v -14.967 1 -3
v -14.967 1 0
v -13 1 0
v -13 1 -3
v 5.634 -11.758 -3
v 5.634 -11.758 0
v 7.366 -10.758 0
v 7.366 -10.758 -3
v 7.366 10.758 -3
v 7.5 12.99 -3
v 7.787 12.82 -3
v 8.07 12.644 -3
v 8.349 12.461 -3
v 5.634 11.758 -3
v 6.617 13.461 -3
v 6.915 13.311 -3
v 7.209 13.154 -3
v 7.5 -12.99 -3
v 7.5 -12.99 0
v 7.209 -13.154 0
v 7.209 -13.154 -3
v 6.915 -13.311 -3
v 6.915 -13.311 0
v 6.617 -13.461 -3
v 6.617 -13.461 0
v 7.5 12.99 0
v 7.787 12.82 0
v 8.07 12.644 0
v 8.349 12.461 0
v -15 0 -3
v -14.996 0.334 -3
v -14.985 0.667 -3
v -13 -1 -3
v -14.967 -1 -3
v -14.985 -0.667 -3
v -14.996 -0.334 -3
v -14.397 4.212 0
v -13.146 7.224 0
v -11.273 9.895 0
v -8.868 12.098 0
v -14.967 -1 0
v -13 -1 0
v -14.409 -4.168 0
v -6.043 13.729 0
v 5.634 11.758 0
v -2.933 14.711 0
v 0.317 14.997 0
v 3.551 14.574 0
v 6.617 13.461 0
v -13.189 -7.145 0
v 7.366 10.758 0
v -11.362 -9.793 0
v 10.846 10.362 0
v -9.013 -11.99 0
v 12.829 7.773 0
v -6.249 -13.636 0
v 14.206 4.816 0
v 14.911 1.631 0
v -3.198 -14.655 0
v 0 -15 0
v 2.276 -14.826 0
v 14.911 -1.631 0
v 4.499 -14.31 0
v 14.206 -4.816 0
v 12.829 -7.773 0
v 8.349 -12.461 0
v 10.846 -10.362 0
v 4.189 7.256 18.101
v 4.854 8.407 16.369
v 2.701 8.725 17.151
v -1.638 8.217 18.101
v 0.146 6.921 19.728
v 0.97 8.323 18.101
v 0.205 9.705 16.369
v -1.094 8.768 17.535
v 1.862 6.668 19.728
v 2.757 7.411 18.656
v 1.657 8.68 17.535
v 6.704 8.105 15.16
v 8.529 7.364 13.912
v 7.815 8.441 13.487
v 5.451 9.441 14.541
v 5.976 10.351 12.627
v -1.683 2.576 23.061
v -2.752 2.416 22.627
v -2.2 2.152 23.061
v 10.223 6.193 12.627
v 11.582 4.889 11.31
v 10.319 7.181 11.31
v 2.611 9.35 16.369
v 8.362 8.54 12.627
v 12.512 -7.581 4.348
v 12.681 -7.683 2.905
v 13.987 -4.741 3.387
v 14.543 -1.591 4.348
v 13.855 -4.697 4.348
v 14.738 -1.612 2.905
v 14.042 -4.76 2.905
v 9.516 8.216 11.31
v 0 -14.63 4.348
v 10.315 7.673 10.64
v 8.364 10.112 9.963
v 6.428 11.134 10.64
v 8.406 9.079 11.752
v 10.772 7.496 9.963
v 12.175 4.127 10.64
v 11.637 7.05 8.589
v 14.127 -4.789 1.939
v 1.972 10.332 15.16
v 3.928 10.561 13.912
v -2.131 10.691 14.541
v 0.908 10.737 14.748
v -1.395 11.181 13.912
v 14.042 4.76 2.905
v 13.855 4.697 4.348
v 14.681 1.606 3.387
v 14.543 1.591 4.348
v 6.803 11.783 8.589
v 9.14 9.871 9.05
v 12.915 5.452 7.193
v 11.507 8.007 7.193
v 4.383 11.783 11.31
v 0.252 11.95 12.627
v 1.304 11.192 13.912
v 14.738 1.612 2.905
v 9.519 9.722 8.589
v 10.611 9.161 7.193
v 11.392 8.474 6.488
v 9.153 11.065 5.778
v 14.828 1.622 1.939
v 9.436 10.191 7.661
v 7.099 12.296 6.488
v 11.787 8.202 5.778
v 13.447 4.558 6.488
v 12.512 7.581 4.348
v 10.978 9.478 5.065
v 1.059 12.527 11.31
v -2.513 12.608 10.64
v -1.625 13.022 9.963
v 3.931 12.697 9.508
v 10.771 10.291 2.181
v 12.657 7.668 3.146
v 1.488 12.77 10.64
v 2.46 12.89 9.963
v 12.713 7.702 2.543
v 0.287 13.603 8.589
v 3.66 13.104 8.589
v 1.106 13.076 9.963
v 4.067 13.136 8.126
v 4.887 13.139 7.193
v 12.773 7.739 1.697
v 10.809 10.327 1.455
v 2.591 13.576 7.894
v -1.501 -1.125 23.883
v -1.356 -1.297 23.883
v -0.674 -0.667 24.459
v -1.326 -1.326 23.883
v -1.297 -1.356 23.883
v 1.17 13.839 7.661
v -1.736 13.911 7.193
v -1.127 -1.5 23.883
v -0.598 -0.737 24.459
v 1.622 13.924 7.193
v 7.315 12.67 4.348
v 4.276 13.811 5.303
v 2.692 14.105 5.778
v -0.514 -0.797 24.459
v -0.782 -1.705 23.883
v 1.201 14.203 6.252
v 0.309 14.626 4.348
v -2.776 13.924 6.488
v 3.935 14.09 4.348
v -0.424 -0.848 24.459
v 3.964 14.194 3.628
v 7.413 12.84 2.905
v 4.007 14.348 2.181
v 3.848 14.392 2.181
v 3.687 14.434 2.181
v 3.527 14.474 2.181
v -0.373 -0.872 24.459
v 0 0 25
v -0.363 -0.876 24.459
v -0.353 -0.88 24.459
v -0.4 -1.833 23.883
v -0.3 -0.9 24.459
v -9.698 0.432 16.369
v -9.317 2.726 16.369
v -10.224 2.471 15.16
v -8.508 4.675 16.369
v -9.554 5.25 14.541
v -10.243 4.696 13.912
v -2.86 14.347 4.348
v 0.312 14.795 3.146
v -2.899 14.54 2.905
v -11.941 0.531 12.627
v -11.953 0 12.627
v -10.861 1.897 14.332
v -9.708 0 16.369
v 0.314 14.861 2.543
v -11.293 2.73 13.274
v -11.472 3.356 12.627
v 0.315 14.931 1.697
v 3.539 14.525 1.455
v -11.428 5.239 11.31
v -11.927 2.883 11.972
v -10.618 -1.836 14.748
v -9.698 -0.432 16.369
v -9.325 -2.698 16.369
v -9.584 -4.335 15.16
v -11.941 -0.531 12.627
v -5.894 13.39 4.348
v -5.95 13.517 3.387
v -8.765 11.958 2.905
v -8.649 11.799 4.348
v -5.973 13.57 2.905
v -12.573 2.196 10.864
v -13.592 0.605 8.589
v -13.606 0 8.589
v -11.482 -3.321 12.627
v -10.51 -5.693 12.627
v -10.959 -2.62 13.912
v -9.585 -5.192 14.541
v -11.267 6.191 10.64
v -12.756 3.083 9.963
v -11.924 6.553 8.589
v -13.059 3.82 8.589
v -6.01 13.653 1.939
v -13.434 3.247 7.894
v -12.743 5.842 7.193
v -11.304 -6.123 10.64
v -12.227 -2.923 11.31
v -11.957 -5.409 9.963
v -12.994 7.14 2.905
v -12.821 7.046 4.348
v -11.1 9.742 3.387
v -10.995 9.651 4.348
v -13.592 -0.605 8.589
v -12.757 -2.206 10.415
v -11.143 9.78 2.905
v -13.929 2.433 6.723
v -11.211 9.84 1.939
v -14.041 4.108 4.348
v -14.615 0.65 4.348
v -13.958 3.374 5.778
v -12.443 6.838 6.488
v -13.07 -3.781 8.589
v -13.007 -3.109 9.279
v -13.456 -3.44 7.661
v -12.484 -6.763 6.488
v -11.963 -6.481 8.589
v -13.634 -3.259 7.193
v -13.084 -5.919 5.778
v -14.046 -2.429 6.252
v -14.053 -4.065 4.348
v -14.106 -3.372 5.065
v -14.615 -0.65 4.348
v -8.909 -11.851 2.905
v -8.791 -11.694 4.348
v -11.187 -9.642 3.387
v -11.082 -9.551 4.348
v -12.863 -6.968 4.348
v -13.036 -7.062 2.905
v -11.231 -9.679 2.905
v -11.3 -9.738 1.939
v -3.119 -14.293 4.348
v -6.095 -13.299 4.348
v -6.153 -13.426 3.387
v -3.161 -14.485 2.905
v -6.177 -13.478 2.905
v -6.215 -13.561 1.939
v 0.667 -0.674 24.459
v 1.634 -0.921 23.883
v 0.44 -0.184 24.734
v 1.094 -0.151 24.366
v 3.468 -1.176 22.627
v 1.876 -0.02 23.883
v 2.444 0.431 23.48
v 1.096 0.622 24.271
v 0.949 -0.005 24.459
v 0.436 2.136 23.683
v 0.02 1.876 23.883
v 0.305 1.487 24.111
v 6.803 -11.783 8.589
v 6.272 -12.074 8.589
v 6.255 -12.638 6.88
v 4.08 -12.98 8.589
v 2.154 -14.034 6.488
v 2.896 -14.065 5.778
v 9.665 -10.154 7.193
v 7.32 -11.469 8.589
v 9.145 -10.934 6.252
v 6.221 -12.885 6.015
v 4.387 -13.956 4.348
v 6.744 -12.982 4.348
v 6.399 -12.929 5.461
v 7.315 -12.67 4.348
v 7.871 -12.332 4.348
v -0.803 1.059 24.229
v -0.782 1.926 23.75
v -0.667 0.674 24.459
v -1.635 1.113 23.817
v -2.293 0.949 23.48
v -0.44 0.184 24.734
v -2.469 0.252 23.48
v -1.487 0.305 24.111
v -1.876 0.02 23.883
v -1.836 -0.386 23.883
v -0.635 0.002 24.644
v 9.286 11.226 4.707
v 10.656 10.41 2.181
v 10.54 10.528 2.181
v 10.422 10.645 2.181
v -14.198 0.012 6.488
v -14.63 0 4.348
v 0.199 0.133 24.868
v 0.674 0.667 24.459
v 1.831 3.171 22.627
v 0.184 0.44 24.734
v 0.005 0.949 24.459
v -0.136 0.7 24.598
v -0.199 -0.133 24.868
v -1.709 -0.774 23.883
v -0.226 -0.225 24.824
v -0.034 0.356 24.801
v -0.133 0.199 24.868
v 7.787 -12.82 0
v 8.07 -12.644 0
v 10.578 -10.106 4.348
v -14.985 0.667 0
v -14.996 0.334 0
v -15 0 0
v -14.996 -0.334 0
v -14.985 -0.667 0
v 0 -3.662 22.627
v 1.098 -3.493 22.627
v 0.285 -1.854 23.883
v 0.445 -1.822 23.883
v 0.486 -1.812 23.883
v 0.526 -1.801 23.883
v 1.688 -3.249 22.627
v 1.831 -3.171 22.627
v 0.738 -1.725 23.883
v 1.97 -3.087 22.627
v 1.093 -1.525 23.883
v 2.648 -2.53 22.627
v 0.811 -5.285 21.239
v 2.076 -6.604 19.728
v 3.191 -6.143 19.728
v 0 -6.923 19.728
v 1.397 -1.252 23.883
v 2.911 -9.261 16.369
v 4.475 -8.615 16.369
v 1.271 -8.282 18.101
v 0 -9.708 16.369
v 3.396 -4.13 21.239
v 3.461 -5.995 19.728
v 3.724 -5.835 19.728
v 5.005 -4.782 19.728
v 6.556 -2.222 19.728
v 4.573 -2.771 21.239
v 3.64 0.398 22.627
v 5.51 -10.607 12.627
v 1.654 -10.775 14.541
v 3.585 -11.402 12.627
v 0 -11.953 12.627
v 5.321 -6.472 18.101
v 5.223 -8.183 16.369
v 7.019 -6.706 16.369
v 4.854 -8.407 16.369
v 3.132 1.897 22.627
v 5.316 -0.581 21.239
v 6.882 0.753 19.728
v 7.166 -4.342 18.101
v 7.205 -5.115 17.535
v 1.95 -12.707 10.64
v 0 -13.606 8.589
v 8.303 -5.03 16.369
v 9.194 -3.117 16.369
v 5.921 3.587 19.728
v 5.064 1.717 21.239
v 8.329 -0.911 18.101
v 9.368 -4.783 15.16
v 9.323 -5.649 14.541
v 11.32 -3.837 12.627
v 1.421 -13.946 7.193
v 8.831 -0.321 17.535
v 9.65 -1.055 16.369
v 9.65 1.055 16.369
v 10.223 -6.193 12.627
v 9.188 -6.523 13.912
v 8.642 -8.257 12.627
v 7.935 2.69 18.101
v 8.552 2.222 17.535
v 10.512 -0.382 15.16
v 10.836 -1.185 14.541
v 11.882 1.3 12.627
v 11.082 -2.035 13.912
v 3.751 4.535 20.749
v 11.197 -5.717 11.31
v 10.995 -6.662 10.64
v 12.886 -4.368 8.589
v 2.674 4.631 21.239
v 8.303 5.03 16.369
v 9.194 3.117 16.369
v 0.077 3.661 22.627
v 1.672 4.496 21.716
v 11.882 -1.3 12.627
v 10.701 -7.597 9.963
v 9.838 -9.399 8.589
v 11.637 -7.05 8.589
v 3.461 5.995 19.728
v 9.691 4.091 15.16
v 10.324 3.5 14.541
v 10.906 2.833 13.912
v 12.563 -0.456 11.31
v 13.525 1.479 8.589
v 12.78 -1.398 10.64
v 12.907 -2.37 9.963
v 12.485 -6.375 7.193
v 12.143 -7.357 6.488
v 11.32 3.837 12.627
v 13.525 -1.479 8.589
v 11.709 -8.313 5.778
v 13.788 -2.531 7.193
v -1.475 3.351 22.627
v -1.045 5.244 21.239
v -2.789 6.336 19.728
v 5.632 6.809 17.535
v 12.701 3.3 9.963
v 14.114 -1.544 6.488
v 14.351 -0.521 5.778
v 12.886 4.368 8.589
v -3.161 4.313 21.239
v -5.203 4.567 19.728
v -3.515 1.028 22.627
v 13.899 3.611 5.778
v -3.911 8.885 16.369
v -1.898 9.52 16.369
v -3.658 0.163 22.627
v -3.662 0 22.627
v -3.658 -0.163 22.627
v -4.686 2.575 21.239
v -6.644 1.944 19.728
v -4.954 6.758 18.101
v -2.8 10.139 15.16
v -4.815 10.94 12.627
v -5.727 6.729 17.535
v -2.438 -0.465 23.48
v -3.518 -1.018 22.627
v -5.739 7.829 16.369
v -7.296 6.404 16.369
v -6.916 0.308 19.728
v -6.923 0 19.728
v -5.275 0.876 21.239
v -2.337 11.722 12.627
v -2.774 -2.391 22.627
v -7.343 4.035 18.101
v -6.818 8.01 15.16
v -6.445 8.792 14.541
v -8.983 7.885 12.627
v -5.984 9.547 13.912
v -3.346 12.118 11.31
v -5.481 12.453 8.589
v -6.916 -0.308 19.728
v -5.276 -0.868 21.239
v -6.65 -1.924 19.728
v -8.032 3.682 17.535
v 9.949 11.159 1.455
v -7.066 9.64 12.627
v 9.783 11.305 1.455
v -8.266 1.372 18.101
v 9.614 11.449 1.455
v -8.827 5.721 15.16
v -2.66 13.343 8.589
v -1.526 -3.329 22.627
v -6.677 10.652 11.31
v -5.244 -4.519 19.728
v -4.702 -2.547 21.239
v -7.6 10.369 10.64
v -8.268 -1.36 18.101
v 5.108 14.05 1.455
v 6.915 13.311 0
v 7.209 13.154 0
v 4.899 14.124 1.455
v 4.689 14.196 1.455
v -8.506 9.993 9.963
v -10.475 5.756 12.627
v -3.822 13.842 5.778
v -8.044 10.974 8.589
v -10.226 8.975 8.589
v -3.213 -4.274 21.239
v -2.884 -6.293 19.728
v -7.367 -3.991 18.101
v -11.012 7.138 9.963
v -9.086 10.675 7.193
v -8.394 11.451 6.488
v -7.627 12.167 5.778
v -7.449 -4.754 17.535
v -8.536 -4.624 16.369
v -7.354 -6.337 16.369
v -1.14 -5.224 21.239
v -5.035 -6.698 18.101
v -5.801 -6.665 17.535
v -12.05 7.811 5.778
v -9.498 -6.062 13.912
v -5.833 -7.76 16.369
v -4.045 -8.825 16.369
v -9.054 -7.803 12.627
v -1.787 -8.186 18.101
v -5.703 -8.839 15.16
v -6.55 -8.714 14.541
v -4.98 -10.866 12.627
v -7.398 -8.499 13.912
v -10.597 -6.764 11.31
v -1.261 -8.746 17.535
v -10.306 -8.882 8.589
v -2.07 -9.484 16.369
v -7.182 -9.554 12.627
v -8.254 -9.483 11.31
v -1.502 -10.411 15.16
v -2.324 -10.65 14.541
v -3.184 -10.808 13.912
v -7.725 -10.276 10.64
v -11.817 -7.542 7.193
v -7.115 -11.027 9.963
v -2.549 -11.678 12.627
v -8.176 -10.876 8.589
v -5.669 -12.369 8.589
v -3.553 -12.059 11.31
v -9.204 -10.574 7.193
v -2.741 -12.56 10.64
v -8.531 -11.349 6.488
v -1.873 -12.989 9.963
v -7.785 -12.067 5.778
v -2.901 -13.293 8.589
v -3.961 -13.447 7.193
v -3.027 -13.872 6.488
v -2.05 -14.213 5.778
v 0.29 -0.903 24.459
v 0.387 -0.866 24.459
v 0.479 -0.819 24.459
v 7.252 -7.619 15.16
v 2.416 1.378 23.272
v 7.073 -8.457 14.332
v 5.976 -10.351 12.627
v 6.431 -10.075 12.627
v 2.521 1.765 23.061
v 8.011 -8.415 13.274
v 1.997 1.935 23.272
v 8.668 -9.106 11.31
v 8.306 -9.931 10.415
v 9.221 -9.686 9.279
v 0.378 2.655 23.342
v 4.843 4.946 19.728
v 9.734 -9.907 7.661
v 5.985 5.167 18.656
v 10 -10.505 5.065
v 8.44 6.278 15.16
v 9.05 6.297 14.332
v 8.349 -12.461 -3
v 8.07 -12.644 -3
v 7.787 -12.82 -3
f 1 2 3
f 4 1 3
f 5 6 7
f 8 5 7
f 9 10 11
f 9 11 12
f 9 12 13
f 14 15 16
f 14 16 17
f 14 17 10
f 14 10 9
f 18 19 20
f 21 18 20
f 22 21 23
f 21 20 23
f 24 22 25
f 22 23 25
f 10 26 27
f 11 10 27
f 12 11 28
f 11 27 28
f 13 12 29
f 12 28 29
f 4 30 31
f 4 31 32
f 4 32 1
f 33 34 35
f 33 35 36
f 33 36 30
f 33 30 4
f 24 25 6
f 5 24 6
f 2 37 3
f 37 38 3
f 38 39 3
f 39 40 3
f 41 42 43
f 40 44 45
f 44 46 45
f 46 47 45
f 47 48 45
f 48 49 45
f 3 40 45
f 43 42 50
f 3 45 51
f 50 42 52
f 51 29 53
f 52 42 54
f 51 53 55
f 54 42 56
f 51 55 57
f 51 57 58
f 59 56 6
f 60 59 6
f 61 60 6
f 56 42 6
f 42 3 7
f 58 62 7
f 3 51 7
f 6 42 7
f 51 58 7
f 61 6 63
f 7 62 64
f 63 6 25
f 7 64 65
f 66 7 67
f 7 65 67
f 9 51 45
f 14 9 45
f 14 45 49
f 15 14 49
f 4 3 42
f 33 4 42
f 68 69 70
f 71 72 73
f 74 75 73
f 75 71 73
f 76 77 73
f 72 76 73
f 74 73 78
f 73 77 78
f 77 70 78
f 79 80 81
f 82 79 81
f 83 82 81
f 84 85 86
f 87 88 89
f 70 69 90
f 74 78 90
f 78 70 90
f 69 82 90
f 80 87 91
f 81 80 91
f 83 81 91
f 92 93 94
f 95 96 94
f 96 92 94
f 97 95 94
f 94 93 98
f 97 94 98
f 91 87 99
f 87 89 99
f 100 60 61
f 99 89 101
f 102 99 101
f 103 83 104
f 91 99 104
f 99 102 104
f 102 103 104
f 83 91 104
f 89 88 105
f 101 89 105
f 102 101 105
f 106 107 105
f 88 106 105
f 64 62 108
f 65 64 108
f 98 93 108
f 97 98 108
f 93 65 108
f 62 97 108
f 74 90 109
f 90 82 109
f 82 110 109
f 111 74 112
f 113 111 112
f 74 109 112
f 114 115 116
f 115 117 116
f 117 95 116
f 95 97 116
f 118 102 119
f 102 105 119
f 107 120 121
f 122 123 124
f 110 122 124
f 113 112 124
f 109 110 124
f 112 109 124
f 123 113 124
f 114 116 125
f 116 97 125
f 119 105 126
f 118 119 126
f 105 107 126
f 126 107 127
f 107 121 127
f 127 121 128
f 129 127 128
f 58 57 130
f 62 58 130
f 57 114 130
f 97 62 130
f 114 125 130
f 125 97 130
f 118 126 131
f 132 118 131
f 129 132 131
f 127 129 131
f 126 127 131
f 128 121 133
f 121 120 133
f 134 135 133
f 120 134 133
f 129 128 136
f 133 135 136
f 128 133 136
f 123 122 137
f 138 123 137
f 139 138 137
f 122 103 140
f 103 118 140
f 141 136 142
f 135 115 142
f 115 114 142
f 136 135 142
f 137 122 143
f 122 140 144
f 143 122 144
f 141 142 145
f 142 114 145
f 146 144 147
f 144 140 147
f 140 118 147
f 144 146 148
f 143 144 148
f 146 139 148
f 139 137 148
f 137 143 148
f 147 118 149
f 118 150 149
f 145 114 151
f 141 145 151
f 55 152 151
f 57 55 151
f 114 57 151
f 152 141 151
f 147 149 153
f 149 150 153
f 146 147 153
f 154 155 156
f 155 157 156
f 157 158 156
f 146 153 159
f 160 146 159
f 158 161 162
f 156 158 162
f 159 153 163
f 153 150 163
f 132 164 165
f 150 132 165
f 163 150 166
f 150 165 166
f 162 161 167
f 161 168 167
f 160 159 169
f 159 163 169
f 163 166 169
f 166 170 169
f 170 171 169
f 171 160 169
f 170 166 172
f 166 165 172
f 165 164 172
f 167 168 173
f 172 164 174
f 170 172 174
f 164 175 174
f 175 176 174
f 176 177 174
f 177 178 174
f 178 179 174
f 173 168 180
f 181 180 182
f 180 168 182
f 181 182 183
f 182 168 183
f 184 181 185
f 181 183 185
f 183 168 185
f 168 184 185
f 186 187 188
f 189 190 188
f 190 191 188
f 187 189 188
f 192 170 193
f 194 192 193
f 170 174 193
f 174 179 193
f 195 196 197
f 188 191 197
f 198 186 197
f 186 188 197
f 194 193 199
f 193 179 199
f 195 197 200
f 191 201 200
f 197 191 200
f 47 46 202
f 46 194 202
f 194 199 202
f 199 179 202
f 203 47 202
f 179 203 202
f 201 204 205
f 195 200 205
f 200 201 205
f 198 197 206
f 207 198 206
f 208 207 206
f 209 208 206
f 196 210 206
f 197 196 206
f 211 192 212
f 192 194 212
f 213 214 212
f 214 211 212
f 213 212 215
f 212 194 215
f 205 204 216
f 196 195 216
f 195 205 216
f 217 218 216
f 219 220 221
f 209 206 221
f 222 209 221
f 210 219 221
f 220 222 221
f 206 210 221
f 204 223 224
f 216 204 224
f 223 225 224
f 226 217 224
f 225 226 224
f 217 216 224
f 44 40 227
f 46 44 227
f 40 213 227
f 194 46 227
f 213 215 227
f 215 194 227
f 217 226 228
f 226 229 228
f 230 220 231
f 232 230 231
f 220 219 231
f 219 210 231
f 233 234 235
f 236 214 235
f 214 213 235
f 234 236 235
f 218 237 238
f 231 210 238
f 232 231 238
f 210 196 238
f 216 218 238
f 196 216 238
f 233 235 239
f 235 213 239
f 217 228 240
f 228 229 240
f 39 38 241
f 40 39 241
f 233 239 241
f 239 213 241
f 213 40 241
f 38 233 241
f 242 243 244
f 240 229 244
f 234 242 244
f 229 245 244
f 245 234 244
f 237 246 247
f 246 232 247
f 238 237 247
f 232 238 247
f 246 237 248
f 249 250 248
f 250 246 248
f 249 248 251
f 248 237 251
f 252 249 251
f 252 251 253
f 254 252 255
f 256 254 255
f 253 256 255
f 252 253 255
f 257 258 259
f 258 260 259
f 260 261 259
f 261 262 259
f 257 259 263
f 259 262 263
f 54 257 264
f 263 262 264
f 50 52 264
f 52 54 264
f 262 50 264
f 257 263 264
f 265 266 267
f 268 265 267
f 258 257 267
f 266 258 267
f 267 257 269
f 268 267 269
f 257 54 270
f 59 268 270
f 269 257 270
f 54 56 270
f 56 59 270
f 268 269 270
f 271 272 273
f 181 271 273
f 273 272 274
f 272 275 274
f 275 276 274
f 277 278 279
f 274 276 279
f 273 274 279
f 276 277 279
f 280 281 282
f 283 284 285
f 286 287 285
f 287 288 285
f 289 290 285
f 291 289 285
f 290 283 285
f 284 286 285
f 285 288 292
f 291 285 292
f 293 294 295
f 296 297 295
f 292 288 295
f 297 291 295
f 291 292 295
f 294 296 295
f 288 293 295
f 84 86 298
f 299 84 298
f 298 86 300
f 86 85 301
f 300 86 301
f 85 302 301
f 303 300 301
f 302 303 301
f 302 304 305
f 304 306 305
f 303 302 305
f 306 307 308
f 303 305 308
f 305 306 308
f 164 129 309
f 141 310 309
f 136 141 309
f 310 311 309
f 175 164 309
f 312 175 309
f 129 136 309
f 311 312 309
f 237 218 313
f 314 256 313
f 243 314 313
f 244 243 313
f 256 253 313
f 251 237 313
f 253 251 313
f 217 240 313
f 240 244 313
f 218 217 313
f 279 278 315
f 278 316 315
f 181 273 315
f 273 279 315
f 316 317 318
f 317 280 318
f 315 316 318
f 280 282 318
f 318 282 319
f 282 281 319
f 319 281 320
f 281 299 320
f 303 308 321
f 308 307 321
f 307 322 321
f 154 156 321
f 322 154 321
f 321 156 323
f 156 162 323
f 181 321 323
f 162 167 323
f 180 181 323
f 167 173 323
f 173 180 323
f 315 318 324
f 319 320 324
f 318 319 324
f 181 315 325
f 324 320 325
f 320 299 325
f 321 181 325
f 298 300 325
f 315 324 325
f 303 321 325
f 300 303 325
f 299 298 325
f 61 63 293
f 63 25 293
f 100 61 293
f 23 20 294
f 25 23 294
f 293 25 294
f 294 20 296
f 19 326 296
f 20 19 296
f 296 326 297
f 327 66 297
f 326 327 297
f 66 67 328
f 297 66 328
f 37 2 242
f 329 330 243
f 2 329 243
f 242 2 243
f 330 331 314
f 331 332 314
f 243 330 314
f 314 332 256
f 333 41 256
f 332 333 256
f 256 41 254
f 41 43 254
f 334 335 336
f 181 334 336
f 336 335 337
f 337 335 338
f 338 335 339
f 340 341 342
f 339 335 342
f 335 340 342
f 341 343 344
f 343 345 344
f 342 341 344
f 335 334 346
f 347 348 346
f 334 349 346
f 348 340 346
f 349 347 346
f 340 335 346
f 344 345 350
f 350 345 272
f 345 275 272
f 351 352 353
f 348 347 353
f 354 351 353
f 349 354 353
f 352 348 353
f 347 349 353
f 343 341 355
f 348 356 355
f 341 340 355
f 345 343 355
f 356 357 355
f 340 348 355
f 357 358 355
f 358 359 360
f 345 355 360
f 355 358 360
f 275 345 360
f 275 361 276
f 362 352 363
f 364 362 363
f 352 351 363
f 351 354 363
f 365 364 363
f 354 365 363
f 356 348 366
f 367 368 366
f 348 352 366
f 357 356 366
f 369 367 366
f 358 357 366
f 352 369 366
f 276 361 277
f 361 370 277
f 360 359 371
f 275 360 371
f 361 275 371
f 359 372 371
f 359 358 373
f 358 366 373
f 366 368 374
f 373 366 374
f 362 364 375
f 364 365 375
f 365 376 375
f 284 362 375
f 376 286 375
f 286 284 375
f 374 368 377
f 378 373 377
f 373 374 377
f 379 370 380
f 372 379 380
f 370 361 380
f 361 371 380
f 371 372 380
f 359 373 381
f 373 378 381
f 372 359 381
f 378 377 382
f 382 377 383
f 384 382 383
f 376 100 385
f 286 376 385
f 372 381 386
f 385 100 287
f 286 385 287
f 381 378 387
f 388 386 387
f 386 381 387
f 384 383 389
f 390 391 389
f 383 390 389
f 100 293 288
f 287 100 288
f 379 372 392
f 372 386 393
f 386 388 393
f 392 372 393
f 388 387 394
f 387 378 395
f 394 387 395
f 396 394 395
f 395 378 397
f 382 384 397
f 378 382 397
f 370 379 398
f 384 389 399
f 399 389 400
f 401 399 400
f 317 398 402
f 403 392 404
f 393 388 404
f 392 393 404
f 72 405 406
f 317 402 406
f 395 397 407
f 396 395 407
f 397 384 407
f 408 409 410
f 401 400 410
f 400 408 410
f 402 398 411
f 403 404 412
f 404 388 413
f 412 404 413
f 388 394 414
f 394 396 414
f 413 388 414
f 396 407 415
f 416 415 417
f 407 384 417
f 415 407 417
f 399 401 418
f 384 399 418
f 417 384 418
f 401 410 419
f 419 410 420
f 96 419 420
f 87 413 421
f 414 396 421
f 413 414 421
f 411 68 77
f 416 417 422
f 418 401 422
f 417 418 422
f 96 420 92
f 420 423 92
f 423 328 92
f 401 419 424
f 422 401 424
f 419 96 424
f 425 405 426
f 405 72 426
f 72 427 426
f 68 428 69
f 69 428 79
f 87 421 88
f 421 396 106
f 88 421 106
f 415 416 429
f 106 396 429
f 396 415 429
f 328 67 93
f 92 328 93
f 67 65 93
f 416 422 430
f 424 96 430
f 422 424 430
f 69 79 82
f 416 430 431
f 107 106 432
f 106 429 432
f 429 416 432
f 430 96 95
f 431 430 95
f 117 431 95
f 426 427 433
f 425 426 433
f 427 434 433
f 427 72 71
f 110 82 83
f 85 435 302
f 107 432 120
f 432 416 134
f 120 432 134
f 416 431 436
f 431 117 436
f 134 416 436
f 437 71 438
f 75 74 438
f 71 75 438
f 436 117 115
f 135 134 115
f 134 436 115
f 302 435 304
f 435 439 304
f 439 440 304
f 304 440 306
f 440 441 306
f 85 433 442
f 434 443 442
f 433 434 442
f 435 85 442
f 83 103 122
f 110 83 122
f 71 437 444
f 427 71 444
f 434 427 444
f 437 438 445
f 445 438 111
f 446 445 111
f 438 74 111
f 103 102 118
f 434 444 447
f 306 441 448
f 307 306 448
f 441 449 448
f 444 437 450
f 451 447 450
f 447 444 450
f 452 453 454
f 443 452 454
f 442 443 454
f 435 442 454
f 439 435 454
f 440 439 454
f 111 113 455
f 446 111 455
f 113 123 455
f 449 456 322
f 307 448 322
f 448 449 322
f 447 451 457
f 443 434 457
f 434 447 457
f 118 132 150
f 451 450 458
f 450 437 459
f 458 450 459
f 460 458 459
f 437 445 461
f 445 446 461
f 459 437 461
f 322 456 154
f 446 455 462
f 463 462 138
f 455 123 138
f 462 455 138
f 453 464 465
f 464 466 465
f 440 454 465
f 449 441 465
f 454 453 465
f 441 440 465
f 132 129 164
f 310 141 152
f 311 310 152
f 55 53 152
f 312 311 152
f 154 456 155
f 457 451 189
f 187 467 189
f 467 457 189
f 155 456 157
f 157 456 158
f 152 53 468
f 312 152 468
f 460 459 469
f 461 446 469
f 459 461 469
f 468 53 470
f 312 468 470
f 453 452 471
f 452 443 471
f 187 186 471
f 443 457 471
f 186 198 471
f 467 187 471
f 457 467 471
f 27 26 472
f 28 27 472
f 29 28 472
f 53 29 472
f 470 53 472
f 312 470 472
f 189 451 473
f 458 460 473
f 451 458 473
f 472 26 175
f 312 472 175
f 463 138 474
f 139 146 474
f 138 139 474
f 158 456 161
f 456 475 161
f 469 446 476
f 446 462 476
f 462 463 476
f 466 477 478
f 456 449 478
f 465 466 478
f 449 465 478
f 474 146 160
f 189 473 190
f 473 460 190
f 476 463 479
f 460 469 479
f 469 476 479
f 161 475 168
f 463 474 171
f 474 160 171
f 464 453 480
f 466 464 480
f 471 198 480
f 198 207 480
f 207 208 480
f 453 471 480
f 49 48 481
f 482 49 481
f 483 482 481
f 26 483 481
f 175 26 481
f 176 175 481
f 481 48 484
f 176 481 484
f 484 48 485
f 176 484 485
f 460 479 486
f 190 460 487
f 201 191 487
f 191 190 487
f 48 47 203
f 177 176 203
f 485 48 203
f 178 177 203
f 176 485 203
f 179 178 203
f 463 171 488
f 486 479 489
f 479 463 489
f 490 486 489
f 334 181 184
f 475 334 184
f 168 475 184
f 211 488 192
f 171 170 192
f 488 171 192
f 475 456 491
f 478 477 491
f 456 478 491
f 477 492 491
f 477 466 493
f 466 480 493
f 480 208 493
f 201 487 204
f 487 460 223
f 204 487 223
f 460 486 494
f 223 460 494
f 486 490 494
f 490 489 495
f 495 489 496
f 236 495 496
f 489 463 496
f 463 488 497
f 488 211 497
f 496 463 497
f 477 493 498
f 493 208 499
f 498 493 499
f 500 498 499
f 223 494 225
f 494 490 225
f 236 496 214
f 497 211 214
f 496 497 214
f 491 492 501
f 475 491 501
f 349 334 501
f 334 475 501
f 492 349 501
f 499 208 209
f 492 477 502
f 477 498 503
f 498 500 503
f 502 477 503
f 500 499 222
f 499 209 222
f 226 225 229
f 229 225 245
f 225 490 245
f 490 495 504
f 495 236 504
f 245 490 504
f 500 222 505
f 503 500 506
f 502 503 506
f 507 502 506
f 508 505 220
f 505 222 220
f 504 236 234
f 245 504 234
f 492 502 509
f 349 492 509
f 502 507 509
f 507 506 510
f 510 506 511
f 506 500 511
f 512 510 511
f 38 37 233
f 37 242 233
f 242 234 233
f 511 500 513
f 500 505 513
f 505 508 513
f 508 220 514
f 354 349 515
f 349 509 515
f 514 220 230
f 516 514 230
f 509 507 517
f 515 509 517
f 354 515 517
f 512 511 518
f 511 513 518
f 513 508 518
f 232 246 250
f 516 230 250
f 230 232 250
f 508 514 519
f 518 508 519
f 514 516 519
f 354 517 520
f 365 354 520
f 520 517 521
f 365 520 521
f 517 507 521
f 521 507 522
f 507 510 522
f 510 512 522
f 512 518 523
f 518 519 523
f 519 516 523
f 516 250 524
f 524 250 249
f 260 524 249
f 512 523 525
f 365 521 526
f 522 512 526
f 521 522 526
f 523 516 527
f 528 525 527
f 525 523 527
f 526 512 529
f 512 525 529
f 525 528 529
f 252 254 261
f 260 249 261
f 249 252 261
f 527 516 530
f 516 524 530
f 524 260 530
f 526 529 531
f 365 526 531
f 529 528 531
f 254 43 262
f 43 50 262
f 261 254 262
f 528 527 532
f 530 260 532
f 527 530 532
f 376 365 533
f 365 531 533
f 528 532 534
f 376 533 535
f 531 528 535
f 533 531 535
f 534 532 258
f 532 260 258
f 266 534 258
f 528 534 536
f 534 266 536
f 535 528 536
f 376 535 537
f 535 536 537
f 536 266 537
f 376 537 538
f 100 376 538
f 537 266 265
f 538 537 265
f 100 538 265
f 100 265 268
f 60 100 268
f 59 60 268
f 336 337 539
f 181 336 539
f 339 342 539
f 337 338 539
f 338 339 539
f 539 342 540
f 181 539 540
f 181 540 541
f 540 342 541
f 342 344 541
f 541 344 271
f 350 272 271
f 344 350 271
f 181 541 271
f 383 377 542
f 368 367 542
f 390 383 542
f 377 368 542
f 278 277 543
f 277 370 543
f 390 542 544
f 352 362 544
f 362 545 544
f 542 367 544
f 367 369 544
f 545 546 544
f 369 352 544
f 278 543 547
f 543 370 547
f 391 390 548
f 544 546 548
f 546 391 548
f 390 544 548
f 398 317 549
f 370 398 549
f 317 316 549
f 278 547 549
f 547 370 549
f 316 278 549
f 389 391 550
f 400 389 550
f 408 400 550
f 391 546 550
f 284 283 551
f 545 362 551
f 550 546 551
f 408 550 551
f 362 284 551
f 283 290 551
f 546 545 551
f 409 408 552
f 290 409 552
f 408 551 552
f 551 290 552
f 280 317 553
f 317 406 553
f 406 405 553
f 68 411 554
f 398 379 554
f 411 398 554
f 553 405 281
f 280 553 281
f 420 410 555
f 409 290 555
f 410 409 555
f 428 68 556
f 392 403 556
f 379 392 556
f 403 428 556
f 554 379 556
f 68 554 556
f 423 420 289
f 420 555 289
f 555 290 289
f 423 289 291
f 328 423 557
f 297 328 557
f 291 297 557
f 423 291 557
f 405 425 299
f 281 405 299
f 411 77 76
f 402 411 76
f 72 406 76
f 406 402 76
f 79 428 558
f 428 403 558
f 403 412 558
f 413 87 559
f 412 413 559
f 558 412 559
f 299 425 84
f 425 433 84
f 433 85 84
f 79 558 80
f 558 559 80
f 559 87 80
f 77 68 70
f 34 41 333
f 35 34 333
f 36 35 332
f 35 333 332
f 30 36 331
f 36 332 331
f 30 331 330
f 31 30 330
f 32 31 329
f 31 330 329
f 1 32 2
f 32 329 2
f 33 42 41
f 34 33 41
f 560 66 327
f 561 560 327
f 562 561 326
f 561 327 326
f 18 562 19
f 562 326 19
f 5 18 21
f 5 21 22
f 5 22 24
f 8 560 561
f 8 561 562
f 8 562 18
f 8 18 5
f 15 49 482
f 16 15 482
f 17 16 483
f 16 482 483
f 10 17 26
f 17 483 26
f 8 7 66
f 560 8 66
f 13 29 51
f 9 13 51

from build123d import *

# Parameters (mm, degrees)
F3_DEPTH = 3
F4_COUNT = 3


with BuildPart() as f1:
    # F0 (on Right) → F1 (revolve)
    with BuildSketch(Plane.YZ):
        with BuildLine():
            Line((-15, 0), (0, 0))
            Line((0, 0), (0, 25))
            ThreePointArc((0, 25), (-10.9011156317, 14.540669379), (-15, 0))
        make_face()
    revolve(axis=Axis((0, 0, 12.5), (0, 0, 1)))

    # F2 (on face) → F3 (join)
    with BuildSketch(Plane(origin=(0, 0, 0), x_dir=(1, 0, 0), z_dir=(0, 0, -1))):
        with BuildLine():
            Line((-13, 0), (-15, 0))
            ThreePointArc((-15, 0), (-14.9916550655, -0.5002783193), (-14.9666295471, -1))
            Line((-14.9666295471, -1), (-13, -1))
            Line((-13, -1), (-13, 0))
        make_face()
        with BuildLine():
            ThreePointArc((-14.9666295471, 1), (-14.9916550655, 0.5002783193), (-15, 0))
            Line((-15, 0), (-13, 0))
            Line((-13, 0), (-13, 1))
            Line((-13, 1), (-14.9666295471, 1))
        make_face()
    extrude(amount=F3_DEPTH)

    # F4: F1 ×3 about axis
    f4_axis = Axis((0, 0, 12.5), (0, 0, 1))


with BuildPart() as f1_1:
    add(f1.part)
    for i in range(1, F4_COUNT):
        add(f1.part.rotate(f4_axis, i * 360 / F4_COUNT))


solid = f1_1.part
